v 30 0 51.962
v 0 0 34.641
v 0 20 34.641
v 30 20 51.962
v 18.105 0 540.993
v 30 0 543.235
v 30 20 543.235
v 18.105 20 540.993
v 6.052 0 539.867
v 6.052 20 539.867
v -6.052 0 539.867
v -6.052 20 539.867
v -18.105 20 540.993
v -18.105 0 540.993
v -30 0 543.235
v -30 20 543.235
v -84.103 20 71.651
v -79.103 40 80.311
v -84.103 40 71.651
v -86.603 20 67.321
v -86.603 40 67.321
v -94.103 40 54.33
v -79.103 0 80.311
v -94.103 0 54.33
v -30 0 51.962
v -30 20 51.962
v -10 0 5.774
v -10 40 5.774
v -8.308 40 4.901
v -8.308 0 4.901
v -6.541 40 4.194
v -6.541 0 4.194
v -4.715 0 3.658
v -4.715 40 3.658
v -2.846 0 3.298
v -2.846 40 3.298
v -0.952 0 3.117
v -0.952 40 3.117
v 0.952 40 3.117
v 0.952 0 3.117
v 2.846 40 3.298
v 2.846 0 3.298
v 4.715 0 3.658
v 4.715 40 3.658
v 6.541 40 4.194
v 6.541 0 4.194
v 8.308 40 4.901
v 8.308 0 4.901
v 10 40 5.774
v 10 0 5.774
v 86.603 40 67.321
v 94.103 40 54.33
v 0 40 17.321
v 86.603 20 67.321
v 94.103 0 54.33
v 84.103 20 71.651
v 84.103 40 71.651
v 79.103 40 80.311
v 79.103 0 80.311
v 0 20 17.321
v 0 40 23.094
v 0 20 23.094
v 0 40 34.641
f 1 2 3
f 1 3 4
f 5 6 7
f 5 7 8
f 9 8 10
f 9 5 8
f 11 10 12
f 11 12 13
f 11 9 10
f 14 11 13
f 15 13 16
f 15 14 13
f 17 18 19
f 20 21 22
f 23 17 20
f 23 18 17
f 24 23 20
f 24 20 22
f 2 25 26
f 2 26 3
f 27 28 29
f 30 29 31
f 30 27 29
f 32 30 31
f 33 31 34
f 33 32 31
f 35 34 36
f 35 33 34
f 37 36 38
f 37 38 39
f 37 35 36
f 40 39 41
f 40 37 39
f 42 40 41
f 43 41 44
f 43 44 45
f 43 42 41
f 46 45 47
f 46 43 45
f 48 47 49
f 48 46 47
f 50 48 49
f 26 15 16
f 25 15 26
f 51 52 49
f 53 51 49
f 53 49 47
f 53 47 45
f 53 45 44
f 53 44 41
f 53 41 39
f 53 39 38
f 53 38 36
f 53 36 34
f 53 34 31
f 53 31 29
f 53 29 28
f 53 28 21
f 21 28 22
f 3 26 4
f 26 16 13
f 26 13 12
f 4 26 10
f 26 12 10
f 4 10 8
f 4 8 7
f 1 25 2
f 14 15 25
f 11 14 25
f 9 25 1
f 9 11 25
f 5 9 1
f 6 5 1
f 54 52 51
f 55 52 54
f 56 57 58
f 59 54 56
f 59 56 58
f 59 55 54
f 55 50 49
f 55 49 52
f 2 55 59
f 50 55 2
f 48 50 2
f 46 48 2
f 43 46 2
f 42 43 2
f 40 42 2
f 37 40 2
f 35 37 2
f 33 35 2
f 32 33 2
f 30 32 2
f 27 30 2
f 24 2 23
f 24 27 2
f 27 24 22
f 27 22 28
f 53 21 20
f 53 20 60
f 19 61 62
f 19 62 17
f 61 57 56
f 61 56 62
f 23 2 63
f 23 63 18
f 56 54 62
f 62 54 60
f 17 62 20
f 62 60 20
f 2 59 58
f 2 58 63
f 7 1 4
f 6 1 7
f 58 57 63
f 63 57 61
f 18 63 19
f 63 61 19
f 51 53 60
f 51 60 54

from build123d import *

# Parameters (mm, degrees)
BOSS_EXTRUDE1_DEPTH = 40
CUT_EXTRUDE1_DEPTH  = 20
BOSS_EXTRUDE2_DEPTH = 20


with BuildPart() as part:
    # Sketch1 → Boss-Extrude1 (new body)
    with BuildSketch(Plane(origin=(0, 0, 0), x_dir=(1, 0, 0), z_dir=(0, 1, 0))):
        with BuildLine():
            Line((10, -5.773502692), (94.102760382, -54.330254038))
            Line((94.102760382, -54.330254038), (79.102760382, -80.311016151))
            Line((79.102760382, -80.311016151), (0, -34.641016151))
            Line((0, -34.641016151), (-79.102760382, -80.311016151))
            Line((-79.102760382, -80.311016151), (-94.102760382, -54.330254038))
            Line((-94.102760382, -54.330254038), (-10, -5.773502692))
            ThreePointArc((-10, -5.773502692), (0, -3.094010768), (10, -5.773502692))
        make_face()
    extrude(amount=BOSS_EXTRUDE1_DEPTH)

    # Sketch2 → Cut-Extrude1 (cut)
    with BuildSketch(Plane(origin=(0, 40, 0), x_dir=(1, 0, 0), z_dir=(0, 1, 0))):
        Polygon((-86.602760382, -67.320635095), (0, -17.320508076), (86.602760382, -67.320635095), (84.102760382, -71.650762114), (0, -23.094010768), (-84.102760382, -71.650762114), align=None)
    extrude(amount=-CUT_EXTRUDE1_DEPTH, mode=Mode.SUBTRACT)


with BuildPart() as body_2:
    # Sketch3 → Boss-Extrude2 (new body)
    with BuildSketch(Plane.XZ):
        with BuildLine():
            Line((-30, 51.961524227), (0, 34.641016151))
            Line((0, 34.641016151), (30, 51.961524227))
            Line((30, 51.961524227), (30, 543.235205853))
            ThreePointArc((30, 543.235205853), (0, 539.72631226), (-30, 543.235205853))
            Line((-30, 543.235205853), (-30, 51.961524227))
        make_face()
    extrude(amount=-BOSS_EXTRUDE2_DEPTH)


solid = Compound([part.part, body_2.part])
